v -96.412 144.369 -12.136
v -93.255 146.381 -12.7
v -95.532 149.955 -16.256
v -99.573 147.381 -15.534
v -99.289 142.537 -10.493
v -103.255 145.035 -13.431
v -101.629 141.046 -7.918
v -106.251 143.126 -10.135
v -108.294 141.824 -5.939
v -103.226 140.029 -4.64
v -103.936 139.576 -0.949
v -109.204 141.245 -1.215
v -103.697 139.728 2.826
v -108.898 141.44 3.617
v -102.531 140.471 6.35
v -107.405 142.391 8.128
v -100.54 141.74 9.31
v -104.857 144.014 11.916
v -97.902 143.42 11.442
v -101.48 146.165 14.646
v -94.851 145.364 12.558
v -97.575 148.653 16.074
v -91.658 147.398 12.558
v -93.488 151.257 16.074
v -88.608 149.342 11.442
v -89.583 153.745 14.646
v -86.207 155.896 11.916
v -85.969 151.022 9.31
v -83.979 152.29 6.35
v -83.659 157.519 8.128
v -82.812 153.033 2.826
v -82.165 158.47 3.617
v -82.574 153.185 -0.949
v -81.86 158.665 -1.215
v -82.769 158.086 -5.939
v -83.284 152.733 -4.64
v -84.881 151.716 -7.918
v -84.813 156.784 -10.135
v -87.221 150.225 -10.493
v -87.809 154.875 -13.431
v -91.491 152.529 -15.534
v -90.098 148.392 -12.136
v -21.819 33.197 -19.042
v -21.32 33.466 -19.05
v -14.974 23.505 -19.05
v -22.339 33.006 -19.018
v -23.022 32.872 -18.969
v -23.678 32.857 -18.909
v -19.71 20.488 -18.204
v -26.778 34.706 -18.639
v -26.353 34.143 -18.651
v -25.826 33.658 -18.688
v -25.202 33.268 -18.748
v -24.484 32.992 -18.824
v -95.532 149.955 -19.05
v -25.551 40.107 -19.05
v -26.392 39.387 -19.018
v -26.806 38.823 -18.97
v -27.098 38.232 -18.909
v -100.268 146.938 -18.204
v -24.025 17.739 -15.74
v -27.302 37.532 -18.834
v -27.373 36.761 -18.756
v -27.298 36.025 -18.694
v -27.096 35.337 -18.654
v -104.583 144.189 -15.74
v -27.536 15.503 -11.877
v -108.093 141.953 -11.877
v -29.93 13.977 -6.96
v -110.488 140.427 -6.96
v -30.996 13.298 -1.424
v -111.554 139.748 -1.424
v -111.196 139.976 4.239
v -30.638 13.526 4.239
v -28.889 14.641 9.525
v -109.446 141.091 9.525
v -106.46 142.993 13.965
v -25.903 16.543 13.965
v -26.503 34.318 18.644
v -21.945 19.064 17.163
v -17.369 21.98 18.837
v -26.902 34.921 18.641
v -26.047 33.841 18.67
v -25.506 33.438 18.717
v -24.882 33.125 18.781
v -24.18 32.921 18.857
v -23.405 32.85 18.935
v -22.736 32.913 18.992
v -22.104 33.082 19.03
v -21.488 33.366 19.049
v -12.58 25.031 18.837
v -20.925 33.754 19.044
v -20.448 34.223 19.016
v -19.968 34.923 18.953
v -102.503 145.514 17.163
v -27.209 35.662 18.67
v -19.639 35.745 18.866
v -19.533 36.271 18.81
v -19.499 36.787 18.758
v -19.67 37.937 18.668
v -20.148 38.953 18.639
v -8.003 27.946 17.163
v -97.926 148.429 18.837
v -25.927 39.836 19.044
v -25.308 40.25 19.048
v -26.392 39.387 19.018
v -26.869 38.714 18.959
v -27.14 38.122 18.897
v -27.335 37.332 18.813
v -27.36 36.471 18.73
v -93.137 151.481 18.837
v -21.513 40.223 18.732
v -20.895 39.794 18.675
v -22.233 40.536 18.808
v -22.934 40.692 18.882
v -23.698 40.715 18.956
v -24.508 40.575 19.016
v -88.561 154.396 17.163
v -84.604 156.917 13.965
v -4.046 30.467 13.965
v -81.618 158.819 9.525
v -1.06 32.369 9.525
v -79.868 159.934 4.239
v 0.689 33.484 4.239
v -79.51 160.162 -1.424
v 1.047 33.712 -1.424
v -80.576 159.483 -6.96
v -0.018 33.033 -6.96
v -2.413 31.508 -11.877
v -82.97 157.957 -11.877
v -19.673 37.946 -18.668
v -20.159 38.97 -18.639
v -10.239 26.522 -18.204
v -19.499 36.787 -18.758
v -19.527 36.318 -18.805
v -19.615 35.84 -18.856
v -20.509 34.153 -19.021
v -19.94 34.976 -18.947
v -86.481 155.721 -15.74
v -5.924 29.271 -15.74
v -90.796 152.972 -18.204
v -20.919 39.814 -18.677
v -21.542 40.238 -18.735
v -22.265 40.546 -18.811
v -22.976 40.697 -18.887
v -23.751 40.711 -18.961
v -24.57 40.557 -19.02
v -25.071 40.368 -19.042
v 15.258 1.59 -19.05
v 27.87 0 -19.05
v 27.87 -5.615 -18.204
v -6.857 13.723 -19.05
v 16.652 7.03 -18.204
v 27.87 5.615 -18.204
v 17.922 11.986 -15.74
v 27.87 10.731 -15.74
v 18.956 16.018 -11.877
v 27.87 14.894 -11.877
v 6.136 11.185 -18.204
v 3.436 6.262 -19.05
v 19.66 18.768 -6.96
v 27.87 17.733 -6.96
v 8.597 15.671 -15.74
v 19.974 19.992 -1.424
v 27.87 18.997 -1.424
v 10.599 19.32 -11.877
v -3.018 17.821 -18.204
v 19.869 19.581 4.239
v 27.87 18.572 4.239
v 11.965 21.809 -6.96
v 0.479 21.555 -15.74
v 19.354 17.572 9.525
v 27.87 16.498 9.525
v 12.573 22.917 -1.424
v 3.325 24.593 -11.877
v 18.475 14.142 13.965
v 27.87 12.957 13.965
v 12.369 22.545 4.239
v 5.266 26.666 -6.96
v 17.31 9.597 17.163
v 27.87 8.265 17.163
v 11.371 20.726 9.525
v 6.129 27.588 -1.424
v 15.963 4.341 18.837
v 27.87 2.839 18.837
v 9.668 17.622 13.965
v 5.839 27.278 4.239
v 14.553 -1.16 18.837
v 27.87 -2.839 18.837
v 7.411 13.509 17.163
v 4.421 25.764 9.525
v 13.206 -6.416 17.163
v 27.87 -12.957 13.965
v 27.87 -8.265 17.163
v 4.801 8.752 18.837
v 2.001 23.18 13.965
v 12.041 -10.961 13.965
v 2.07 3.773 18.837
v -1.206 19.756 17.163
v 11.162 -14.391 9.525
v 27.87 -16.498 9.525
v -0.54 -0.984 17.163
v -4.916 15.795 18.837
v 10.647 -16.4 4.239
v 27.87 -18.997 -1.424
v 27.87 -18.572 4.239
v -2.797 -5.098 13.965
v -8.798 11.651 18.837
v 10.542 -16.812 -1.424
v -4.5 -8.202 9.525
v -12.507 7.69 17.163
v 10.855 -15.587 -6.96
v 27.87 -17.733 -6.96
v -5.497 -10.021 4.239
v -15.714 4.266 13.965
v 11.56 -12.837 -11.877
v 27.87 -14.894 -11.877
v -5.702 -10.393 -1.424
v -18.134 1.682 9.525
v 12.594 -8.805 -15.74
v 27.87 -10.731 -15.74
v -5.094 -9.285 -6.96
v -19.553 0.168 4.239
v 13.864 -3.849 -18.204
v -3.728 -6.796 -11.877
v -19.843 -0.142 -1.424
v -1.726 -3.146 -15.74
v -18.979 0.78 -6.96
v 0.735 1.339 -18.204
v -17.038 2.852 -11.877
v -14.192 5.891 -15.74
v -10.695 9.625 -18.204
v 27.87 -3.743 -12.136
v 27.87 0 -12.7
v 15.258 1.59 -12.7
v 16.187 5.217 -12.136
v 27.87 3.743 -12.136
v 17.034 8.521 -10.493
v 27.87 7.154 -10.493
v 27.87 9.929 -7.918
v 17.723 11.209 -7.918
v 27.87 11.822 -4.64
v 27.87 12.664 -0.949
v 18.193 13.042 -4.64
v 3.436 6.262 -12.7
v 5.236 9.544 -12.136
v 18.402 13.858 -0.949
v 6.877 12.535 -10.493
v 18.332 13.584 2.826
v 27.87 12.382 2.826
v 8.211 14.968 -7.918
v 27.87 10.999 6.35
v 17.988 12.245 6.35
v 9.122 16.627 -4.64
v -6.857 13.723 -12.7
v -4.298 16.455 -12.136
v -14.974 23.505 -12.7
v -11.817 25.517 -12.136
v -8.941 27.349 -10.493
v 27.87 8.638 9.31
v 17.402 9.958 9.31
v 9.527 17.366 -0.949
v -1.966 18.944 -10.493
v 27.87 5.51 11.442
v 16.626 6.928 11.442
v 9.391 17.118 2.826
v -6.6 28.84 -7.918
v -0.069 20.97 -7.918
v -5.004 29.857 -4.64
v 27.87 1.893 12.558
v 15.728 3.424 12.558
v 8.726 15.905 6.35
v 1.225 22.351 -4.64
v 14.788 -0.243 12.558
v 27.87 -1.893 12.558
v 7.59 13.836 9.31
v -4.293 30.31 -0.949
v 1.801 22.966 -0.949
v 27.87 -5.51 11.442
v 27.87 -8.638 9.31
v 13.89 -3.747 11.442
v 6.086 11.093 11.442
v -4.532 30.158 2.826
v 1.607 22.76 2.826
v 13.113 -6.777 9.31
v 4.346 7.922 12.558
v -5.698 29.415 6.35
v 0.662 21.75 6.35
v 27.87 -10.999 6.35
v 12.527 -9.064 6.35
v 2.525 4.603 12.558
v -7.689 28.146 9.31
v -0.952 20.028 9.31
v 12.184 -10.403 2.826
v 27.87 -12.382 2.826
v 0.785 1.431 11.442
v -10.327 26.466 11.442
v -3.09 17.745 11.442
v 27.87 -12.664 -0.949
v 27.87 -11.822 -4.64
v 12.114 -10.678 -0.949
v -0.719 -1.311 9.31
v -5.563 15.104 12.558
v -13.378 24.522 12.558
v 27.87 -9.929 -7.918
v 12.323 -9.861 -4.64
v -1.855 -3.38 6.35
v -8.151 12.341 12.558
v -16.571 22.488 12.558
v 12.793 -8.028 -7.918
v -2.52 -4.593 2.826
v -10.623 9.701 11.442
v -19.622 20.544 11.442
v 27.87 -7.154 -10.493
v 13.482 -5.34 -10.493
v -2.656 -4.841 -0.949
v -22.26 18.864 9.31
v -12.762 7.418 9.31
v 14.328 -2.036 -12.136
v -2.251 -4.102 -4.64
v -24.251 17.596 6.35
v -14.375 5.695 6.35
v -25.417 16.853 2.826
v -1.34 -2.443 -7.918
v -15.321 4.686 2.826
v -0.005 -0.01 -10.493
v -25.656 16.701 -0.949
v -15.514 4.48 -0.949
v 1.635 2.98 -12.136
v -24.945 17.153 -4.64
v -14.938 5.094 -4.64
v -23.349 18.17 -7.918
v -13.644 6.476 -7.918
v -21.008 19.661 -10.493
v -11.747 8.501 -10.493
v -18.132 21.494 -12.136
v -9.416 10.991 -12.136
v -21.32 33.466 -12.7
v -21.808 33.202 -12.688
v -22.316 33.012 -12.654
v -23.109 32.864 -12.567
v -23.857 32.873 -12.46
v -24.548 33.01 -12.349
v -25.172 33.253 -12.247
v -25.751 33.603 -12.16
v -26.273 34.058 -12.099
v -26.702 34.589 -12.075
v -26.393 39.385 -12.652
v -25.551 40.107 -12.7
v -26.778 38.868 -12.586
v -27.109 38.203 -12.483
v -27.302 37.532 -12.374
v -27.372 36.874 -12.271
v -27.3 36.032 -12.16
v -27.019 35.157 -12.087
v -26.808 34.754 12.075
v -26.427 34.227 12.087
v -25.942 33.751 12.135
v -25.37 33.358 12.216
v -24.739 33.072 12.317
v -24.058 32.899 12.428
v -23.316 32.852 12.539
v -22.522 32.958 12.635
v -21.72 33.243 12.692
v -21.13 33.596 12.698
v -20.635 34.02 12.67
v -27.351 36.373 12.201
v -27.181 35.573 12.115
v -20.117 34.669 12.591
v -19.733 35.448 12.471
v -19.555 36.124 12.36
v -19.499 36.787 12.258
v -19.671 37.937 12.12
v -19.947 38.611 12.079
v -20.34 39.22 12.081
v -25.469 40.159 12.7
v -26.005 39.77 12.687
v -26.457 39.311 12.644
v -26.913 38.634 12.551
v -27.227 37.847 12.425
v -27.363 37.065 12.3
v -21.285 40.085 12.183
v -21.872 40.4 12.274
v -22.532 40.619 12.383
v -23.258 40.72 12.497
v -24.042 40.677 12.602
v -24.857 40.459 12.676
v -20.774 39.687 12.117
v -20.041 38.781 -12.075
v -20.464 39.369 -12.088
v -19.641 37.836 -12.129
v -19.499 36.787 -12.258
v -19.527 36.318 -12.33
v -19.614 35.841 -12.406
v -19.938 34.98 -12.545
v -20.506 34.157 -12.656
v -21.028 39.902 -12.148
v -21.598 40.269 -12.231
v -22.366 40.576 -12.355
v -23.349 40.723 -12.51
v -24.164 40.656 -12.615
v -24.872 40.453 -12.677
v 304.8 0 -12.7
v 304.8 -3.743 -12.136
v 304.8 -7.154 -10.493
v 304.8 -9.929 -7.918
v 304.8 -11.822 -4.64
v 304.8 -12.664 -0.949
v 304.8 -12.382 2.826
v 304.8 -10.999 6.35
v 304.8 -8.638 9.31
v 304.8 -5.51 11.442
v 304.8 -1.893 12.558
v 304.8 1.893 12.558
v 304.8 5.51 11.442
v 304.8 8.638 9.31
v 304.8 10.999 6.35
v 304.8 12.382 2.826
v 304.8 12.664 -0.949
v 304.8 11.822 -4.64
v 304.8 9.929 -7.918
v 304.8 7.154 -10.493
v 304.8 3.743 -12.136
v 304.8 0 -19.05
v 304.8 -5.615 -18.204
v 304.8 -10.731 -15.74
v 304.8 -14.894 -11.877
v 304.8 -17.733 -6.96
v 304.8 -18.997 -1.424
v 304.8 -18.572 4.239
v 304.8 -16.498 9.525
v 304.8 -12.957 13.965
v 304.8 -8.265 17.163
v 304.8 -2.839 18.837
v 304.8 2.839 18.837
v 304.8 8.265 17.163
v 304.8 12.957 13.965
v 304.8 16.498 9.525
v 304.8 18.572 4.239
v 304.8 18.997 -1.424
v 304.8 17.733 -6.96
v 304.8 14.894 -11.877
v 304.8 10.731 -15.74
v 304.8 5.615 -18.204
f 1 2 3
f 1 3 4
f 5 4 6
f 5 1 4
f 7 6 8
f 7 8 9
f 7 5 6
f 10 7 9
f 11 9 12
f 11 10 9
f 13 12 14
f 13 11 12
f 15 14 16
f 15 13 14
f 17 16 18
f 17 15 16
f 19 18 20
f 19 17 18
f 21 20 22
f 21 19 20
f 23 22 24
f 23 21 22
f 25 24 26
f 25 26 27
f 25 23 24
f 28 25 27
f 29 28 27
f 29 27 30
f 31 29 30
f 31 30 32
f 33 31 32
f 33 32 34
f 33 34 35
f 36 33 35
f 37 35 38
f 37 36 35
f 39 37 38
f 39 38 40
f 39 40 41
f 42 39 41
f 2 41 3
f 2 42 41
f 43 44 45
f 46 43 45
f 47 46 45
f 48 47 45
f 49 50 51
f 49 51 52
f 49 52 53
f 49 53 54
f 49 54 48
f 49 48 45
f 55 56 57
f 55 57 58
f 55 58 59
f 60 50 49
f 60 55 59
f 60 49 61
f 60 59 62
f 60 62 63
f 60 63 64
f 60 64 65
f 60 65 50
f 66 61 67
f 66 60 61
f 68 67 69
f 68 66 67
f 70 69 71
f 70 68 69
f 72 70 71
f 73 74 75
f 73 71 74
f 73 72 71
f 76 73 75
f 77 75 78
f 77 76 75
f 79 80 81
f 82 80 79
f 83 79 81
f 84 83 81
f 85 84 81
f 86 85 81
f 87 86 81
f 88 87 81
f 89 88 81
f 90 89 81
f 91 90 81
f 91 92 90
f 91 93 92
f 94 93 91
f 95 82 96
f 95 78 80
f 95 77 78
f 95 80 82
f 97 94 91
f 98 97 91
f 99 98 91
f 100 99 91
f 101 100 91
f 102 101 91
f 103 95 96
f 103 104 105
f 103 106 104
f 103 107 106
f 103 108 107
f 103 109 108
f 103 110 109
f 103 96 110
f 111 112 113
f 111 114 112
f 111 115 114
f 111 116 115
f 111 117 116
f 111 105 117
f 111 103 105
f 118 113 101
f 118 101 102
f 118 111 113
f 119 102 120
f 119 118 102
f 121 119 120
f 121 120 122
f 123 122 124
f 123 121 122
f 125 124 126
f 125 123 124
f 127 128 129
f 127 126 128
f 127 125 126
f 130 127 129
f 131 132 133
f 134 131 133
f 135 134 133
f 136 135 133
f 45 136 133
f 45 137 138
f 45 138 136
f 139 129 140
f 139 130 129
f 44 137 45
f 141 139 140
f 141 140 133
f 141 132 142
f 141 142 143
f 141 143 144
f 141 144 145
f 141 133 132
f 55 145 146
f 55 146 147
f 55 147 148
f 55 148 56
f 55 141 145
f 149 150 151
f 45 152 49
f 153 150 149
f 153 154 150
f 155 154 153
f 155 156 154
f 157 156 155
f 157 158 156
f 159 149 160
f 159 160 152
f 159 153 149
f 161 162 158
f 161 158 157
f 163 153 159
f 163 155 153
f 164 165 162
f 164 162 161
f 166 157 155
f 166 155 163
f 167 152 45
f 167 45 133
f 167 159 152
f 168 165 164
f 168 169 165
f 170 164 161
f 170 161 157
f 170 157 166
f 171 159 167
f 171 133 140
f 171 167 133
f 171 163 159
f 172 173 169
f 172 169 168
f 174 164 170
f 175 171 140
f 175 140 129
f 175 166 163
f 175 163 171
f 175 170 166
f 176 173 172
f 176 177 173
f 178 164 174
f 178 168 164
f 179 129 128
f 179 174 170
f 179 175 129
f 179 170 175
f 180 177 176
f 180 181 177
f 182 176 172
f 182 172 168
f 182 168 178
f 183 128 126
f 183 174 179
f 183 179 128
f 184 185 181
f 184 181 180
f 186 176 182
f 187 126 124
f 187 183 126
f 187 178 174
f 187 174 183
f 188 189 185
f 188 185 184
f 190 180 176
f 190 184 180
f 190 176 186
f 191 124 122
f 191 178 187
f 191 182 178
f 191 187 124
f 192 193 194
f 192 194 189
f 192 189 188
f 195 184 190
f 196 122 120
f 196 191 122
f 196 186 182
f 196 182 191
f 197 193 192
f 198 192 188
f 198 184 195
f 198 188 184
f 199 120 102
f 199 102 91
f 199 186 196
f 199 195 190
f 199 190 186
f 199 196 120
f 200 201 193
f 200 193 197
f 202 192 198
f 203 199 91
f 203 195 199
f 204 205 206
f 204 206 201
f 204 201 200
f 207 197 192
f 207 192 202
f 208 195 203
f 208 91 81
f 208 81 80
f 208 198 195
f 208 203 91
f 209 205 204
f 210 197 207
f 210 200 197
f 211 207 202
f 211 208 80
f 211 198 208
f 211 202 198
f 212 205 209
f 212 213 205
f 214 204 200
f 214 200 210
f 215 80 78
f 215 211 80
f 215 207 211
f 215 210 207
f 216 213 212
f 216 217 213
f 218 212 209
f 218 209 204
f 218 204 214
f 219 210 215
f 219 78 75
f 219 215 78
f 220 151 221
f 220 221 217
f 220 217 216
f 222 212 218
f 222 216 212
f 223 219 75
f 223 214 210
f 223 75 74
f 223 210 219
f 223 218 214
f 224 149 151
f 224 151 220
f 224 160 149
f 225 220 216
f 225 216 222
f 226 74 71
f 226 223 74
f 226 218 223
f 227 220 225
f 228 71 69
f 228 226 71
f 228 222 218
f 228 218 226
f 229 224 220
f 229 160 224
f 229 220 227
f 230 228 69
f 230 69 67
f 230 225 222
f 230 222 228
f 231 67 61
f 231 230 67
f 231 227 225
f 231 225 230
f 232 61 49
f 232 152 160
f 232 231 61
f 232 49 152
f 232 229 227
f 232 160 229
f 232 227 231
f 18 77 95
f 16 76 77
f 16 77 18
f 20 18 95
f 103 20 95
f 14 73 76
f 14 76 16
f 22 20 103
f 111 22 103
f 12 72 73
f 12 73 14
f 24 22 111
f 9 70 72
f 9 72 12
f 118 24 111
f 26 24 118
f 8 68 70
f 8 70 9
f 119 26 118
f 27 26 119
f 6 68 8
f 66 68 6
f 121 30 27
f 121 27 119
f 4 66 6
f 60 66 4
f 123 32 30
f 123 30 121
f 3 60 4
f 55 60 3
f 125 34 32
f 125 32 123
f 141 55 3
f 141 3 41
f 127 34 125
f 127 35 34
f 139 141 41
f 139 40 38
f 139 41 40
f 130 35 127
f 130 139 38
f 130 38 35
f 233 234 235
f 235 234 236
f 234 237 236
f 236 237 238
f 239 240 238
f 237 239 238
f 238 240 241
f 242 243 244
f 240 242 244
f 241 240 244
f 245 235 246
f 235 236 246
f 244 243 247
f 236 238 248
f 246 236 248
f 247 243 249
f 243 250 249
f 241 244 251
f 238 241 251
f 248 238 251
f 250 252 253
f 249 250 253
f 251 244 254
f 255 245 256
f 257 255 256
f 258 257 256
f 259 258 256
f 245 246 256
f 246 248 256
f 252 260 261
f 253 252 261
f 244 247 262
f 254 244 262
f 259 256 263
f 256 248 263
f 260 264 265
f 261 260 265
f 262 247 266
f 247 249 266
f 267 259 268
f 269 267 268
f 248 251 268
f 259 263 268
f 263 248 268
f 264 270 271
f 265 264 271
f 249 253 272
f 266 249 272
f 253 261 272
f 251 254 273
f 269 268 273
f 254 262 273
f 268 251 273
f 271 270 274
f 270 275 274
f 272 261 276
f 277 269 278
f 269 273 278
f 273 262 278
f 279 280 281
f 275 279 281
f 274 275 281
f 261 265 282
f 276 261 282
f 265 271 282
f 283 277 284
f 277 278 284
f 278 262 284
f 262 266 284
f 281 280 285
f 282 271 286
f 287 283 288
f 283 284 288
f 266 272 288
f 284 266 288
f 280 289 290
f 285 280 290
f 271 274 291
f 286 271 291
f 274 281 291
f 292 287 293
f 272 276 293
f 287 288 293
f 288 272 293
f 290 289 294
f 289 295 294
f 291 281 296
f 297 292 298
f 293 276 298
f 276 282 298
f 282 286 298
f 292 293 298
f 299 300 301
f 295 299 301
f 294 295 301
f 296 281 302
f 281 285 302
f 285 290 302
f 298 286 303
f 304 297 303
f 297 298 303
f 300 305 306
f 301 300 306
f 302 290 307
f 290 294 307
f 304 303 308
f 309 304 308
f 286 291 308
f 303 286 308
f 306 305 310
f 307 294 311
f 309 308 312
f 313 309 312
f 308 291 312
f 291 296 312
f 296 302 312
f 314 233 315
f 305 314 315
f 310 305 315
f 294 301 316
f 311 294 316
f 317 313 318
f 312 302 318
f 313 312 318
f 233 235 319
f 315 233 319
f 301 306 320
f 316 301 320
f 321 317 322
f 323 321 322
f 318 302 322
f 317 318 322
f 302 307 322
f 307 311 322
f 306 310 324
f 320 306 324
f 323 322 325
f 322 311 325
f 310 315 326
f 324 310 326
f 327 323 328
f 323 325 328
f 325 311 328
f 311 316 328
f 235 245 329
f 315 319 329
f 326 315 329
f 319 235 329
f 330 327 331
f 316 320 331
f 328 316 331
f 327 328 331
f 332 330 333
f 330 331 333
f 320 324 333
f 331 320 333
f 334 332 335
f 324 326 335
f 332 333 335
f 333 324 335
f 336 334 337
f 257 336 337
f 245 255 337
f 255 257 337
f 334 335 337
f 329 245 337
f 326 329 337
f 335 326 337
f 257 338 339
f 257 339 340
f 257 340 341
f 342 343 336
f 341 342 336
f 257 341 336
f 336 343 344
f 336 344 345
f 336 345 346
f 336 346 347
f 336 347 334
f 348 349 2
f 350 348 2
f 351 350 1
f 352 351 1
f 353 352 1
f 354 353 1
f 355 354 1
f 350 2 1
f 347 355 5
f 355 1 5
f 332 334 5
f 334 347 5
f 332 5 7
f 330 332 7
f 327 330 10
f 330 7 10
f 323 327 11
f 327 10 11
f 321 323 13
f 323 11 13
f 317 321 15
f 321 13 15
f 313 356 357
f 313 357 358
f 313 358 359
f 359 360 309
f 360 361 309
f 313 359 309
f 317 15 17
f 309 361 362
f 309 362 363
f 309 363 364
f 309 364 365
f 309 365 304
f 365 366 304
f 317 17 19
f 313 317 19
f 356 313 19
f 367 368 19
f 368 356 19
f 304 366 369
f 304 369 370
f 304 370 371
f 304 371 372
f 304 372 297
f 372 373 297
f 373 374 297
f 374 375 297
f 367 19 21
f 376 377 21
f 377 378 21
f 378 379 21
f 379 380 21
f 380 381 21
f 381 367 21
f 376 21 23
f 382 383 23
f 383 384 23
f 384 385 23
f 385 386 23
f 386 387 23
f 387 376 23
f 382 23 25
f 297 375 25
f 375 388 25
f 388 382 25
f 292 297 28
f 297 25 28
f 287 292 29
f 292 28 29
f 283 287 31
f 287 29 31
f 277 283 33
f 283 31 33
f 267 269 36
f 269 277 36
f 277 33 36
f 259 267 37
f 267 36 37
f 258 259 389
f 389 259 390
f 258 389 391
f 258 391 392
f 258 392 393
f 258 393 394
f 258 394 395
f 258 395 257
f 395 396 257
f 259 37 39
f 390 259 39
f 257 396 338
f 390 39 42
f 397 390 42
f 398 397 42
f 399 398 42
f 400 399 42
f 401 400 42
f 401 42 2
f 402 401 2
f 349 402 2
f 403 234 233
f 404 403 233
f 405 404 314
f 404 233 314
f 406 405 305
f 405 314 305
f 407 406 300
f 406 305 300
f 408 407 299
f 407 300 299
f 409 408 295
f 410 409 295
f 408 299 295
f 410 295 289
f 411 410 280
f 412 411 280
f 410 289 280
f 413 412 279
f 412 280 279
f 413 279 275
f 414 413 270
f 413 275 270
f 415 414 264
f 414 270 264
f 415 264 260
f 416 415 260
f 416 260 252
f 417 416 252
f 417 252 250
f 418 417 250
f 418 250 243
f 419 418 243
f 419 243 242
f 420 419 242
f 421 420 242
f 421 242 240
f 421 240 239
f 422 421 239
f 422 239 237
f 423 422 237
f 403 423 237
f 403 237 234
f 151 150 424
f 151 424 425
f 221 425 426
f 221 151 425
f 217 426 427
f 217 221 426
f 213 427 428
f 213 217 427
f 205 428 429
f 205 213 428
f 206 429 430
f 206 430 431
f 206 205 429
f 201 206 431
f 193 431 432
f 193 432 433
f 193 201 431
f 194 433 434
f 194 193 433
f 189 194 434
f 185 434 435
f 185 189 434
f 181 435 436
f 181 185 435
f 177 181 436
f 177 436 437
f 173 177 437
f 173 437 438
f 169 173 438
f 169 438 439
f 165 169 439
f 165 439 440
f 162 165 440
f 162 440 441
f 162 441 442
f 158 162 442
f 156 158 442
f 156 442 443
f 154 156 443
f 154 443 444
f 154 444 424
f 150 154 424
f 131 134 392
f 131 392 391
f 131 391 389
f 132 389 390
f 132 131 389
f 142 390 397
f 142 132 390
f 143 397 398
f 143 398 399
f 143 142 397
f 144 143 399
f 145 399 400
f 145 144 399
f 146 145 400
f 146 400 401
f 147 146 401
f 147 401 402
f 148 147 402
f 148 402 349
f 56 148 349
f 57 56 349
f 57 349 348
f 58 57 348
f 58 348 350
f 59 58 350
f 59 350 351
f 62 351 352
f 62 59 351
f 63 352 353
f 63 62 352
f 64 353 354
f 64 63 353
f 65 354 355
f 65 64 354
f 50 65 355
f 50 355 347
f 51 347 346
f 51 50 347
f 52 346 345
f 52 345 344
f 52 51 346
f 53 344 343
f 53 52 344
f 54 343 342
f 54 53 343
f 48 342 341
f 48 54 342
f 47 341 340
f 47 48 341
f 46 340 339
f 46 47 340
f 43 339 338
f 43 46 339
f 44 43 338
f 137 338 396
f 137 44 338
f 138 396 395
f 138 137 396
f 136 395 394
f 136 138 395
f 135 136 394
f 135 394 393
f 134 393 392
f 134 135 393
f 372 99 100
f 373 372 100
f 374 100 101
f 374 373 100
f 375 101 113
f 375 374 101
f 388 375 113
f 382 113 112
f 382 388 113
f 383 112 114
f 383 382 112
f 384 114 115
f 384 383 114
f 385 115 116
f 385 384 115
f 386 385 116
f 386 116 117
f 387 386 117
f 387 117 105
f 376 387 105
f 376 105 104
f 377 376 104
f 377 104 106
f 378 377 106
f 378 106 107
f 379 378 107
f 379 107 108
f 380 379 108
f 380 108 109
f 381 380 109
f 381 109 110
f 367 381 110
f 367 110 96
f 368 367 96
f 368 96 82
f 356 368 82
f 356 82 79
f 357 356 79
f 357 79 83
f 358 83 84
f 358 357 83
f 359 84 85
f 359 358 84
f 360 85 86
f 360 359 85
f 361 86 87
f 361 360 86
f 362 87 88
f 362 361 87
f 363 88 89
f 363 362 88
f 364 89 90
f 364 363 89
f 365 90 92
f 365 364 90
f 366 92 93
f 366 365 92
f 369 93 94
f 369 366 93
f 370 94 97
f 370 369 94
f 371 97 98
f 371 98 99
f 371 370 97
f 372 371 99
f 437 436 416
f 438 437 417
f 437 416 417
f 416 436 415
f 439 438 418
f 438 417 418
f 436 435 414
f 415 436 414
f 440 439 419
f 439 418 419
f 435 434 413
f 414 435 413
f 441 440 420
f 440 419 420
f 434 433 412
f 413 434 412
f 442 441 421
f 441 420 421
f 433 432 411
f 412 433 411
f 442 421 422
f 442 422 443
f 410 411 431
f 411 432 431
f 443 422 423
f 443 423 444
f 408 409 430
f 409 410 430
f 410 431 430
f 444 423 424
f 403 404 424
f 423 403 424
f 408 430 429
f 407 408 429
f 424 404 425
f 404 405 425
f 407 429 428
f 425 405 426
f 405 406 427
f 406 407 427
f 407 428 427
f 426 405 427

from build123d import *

# Parameters (mm, degrees)
SWEEP1_PROFILE_R        = 19.05
CUT_SWEEP1_PROFILE_R    = 12.7
CUT_EXTRUDE1_DEPTH      = 345.85787932
CUT_EXTRUDE1_DEPTH_BACK = 345.85787932
SKETCH46_R              = 3.937
CHAMFER3_SIZE           = 3.556
CHAMFER3_SIZE2          = 4.237875775


with BuildPart() as part:
    # Sweep1: sweep along a path in Sketch1
    with BuildLine(Plane.XY) as sweep1_path:
        Line((304.8, 0), (27.869834361, 0))
        ThreePointArc((27.869834361, 0), (3.4356049, 6.26228081), (-14.974451087, 23.505179896))
        Line((-14.974451087, 23.505179896), (-95.531870364, 149.954999066))
    # Sweep1 profile (on start of the path) → Sweep1 (sweep)
    with BuildSketch(Plane(origin=(304.8, 0, 0), x_dir=(0, 0, -1), z_dir=(-1, 0, 0))):
        Circle(SWEEP1_PROFILE_R)
    sweep(path=sweep1_path.line)

    # Cut-Sweep1: sweep along a path in Sketch1<2>
    with BuildLine(Plane.XY) as cut_sweep1_path:
        Line((304.8, 0), (27.869834361, 0))
        ThreePointArc((27.869834361, 0), (3.4356049, 6.26228081), (-14.974451087, 23.505179896))
        Line((-14.974451087, 23.505179896), (-95.531870364, 149.954999066))
    # Cut-Sweep1 profile (on start of the path) → Cut-Sweep1 (sweep, cut)
    with BuildSketch(Plane(origin=(304.8, 0, 0), x_dir=(0, 0, -1), z_dir=(-1, 0, 0))):
        Circle(CUT_SWEEP1_PROFILE_R)
    sweep(path=cut_sweep1_path.line, mode=Mode.SUBTRACT)

    # Sketch46 → Cut-Extrude1 (cut, two sides: drawn at the far end of the back side and taken through both)
    with BuildSketch(Plane.XY.offset(-CUT_EXTRUDE1_DEPTH_BACK)):
        with Locations((-23.435845319, 36.786908385)):
            Circle(SKETCH46_R)
    extrude(amount=CUT_EXTRUDE1_DEPTH + CUT_EXTRUDE1_DEPTH_BACK, mode=Mode.SUBTRACT)

    # Chamfer3
    chamfer3_edges = [part.edges().sort_by_distance(p)[0] for p in [
        (-95.531870364, 149.954999066, 12.7),
    ]]
    chamfer3_side = [part.faces().sort_by_distance(p)[0] for p in [
        (-95.531870364, 149.954999066, 18.511184633),
    ]]
    chamfer(chamfer3_edges, length=CHAMFER3_SIZE, length2=CHAMFER3_SIZE2, reference=chamfer3_side[0])


solid = part.part
